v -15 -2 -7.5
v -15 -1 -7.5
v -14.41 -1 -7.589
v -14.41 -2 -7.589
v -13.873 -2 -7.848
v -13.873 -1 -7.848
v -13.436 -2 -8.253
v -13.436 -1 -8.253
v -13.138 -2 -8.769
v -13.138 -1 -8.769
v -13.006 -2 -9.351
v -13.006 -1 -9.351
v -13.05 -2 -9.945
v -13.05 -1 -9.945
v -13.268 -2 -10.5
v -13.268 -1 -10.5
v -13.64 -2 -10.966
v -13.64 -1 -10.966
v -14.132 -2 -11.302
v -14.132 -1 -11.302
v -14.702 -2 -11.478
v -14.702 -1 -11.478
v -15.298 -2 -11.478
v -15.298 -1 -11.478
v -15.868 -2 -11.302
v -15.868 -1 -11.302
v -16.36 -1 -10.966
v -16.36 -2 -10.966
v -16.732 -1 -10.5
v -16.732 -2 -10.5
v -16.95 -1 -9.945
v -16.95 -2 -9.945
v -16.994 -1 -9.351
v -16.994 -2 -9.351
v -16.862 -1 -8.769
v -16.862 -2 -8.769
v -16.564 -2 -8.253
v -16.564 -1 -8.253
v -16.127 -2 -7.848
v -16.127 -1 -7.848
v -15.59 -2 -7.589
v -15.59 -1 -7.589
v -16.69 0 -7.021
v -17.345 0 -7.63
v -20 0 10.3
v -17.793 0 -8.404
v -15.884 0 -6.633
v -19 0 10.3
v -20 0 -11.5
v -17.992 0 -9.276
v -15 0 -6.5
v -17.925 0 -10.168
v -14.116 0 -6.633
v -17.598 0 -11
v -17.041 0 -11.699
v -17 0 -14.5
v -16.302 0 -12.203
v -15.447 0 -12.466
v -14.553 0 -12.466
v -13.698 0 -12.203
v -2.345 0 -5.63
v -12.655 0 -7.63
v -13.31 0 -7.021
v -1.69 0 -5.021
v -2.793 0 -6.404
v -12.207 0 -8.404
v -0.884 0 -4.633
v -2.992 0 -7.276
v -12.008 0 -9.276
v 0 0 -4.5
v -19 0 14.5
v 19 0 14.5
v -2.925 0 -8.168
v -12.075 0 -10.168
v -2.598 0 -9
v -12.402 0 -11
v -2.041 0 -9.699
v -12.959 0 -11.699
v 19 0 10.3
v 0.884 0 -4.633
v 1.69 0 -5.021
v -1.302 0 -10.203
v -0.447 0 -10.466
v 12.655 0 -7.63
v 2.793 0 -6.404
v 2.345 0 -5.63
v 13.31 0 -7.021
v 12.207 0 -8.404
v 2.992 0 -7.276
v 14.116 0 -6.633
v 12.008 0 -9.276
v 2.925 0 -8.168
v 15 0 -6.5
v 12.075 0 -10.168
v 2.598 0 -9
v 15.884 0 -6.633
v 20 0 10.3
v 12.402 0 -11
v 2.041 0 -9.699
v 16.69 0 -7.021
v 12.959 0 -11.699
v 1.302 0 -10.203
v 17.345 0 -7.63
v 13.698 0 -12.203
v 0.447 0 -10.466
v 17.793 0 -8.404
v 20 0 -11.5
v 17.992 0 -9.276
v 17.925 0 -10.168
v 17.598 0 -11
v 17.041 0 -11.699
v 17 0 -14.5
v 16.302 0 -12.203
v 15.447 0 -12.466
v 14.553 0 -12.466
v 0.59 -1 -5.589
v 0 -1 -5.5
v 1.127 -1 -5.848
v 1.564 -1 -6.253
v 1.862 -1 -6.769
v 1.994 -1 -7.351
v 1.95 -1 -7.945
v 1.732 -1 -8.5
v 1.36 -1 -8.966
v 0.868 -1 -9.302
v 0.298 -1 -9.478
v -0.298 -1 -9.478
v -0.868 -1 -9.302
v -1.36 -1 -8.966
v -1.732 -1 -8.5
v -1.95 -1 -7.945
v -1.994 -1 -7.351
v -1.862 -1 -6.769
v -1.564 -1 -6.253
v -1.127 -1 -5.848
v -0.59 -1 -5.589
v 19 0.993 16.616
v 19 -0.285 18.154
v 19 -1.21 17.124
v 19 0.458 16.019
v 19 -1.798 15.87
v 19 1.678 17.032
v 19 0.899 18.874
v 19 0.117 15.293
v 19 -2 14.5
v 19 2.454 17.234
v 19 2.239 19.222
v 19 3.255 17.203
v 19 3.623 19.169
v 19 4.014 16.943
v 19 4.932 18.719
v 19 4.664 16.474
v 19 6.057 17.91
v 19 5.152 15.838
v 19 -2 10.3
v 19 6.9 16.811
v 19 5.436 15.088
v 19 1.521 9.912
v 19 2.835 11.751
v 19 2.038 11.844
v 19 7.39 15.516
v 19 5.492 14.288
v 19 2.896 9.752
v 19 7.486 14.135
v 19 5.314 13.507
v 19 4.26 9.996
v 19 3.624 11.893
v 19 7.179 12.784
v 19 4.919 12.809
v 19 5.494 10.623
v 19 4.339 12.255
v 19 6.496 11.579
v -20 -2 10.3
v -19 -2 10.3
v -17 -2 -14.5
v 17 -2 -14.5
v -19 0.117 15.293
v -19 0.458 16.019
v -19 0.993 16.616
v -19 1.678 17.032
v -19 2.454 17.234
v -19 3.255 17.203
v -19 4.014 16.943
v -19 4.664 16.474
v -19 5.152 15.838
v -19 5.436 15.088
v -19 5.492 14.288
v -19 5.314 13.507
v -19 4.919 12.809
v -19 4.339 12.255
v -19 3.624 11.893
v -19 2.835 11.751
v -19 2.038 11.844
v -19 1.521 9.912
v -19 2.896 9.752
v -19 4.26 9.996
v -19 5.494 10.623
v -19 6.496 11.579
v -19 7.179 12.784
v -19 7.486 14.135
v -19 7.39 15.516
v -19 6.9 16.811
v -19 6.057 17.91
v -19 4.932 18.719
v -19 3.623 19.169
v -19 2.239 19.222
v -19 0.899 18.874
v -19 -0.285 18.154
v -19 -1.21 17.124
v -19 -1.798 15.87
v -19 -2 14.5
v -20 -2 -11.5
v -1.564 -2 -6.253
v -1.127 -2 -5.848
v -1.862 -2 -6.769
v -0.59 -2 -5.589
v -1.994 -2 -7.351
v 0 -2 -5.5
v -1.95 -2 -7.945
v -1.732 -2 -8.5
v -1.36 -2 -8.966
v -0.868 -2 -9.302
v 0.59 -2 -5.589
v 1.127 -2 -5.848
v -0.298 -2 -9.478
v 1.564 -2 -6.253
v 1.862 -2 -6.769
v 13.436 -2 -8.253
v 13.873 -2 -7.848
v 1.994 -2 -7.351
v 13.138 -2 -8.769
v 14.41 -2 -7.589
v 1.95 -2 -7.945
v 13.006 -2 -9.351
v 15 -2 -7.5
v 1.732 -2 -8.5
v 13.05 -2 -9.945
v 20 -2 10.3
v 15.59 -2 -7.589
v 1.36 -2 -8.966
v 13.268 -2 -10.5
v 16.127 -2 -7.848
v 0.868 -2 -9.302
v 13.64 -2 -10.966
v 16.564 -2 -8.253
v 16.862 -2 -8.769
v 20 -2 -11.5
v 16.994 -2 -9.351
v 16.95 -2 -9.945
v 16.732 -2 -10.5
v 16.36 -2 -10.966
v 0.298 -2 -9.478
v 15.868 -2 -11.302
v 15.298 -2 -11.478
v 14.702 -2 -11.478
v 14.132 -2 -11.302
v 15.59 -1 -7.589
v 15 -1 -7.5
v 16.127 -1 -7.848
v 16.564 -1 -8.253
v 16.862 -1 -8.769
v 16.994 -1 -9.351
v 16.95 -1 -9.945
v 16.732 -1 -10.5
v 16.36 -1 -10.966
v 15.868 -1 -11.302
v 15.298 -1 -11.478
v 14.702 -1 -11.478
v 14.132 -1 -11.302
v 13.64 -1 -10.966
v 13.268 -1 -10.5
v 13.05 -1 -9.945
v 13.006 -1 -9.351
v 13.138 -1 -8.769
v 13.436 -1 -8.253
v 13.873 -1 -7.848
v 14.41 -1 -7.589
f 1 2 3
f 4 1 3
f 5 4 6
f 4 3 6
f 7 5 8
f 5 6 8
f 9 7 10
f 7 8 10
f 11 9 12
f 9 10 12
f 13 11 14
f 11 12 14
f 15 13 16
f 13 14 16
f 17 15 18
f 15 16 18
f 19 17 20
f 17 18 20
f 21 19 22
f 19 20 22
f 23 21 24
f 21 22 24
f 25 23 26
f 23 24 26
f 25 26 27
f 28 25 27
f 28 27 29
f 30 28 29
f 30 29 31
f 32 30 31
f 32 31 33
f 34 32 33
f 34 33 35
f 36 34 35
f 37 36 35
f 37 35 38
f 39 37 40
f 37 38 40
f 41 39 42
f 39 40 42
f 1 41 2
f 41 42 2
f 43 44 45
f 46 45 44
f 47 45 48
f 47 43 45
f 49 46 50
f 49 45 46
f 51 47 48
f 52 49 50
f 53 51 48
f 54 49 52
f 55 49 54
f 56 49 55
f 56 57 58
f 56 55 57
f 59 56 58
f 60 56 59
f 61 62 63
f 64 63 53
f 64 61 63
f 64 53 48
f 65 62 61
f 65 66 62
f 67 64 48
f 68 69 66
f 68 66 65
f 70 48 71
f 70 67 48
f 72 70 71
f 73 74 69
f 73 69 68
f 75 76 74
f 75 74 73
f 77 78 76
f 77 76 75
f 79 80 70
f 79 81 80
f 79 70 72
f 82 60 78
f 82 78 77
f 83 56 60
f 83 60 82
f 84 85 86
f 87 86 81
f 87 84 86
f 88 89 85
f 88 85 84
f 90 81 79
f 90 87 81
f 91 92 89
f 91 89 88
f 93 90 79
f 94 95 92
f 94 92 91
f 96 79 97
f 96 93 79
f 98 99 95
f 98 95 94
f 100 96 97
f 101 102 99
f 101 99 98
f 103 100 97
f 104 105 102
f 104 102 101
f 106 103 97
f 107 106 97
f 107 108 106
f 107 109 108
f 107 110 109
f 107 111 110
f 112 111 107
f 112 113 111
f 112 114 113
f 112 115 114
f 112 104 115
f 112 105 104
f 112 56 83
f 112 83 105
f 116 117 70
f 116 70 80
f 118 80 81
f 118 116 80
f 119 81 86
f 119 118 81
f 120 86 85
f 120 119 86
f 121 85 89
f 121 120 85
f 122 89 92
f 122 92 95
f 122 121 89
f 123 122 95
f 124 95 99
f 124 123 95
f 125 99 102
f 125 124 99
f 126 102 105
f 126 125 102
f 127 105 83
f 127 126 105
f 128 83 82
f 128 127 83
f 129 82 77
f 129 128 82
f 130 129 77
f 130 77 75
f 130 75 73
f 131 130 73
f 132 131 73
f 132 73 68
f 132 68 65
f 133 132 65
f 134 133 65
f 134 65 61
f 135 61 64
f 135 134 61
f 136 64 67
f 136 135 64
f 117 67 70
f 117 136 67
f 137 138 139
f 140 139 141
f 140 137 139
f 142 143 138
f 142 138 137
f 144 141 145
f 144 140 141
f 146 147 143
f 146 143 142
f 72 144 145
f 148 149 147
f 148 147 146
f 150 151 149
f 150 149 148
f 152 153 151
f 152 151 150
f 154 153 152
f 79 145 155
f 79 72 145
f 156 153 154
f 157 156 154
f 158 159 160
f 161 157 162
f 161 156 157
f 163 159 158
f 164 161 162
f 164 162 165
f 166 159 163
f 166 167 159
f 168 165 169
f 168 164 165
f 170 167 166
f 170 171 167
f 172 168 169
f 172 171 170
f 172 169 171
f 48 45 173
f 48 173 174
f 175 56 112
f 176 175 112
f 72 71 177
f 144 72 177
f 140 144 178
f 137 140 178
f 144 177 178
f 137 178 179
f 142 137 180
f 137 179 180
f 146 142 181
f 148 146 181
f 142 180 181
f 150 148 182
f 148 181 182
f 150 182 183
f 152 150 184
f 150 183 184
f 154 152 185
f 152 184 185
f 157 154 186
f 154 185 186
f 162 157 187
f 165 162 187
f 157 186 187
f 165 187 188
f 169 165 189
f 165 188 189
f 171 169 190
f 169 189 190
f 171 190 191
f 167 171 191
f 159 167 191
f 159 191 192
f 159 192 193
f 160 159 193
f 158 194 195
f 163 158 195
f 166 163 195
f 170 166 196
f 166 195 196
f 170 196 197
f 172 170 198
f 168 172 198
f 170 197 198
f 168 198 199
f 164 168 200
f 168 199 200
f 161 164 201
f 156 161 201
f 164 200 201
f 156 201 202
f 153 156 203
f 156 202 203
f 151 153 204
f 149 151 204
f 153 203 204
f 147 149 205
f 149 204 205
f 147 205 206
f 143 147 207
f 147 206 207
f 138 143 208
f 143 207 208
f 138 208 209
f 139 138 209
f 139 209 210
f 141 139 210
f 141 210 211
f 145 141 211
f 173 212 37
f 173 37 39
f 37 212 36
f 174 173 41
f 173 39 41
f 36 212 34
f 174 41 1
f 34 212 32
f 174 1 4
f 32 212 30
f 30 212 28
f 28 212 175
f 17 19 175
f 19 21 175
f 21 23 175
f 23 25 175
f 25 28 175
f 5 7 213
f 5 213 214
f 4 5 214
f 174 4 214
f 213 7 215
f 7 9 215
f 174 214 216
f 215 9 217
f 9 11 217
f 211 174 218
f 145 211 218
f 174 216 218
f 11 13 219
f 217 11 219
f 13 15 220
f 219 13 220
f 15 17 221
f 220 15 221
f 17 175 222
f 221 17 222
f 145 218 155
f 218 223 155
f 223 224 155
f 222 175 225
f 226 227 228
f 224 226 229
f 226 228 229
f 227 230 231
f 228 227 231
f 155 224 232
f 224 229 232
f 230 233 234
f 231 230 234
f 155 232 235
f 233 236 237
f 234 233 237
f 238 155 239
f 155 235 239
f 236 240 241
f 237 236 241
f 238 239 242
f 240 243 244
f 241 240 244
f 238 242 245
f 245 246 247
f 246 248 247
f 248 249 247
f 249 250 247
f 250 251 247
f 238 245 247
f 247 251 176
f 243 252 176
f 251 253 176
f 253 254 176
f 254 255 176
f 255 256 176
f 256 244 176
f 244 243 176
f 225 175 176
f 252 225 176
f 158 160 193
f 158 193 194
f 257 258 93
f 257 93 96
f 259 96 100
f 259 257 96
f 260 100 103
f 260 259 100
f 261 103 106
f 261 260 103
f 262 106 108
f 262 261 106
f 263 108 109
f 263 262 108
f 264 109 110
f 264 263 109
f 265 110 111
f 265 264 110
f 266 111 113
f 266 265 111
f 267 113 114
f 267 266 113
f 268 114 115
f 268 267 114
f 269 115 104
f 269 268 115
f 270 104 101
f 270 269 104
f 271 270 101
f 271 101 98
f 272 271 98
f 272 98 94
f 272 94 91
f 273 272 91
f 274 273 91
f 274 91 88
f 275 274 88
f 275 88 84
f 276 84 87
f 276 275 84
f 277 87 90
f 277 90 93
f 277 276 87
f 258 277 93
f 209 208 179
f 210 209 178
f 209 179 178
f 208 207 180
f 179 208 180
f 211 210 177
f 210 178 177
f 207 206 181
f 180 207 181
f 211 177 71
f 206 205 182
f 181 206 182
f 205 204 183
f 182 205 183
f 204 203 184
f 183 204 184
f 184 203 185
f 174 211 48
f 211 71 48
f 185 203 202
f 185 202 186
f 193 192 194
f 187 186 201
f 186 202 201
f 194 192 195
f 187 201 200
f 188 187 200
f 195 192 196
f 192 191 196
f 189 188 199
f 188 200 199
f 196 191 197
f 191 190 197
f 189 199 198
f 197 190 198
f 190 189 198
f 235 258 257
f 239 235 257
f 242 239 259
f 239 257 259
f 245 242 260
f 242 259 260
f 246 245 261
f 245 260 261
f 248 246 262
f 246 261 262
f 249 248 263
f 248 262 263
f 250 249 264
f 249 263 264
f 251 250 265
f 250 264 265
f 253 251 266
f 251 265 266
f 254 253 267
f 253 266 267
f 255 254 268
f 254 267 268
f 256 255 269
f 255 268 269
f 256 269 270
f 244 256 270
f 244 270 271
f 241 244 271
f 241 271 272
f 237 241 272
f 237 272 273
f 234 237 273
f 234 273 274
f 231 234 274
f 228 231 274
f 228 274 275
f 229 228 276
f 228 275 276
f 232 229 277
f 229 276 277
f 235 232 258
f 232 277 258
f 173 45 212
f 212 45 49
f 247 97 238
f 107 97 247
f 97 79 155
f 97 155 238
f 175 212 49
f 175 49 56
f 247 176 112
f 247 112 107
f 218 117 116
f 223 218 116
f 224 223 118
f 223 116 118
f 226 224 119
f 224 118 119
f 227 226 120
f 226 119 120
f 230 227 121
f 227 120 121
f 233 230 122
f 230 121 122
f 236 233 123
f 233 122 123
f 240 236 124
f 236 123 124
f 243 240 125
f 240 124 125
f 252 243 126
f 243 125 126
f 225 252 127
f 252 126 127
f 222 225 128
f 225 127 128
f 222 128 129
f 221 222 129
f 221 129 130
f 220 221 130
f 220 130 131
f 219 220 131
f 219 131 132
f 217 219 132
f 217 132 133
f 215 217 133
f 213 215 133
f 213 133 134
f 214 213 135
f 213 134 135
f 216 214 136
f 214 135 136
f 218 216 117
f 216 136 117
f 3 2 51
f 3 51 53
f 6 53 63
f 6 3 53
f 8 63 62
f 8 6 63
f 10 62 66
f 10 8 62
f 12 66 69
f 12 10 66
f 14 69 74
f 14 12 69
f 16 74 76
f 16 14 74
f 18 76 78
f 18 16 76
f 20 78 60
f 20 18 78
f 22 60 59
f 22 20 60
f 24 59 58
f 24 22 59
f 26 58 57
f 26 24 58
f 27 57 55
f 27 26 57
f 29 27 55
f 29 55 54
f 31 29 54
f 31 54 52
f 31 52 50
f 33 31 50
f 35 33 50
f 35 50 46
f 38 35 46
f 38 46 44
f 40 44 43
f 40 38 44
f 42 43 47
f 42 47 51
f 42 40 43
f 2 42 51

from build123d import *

# Parameters (mm, degrees)
SKETCH1_W           = 40
SKETCH1_H           = 29
BASE_FLANGE1_DEPTH  = 2
BREAK_CORNER1_START = -2
BREAK_CORNER1_DEPTH = 2
HEM2_START          = -19
HEM2_DEPTH          = 38
SKETCH10_W          = 1
SKETCH10_H          = 4.2
CUT_EXTRUDE1_DEPTH  = 10
SKETCH11_R          = 2
CUT_EXTRUDE2_DEPTH  = 2
CHAMFER1_SIZE       = 1


# Read off the part's stored shape, not the designer's step: Break-Corner1, Hem2
# Sheet-metal steps are written as plain solids
with BuildPart() as part:
    # Sketch1 → Base-Flange1 (new body)
    with BuildSketch(Plane(origin=(0, 0, 0), x_dir=(1, 0, 0), z_dir=(0, 1, 0))):
        Rectangle(SKETCH1_W, SKETCH1_H)
    extrude(amount=-BASE_FLANGE1_DEPTH)

    # Break-Corner1 outline → Break-Corner1 (cut)
    with BuildSketch(Plane(origin=(0, 0, 0), x_dir=(1, 0, 0), z_dir=(0, 1, 0)).offset(BREAK_CORNER1_START)):
        Polygon((-20, 14.5), (-20, 11.5), (-17, 14.5), align=None)
        Polygon((20, 14.5), (17, 14.5), (20, 11.5), align=None)
    extrude(amount=BREAK_CORNER1_DEPTH, mode=Mode.SUBTRACT)

    # Hem2 outline → Hem2 (add)
    with BuildSketch(Plane.YZ.offset(HEM2_START)):
        with BuildLine():
            Line((2.038247626, 11.843703978), (1.520609536, 9.911852325))
            ThreePointArc((1.520609536, 9.911852325), (6.518428366, 17.391616788), (-2, 14.5))
            Line((-2, 14.5), (0, 14.5))
            ThreePointArc((0, 14.5), (4.931721686, 16.17409393), (2.038247626, 11.843703978))
        make_face()
    extrude(amount=HEM2_DEPTH)

    # Sketch10 → Cut-Extrude1 (cut)
    with BuildSketch(Plane(origin=(0, 0, 0), x_dir=(1, 0, 0), z_dir=(0, 1, 0))):
        with Locations((19.5, -12.4)):
            Rectangle(SKETCH10_W, SKETCH10_H)
        with Locations((-19.5, -12.4)):
            Rectangle(SKETCH10_W, SKETCH10_H)
    extrude(amount=-CUT_EXTRUDE1_DEPTH, mode=Mode.SUBTRACT)

    # Sketch11 → Cut-Extrude2 (cut)
    with BuildSketch(Plane(origin=(0, 0, 0), x_dir=(1, 0, 0), z_dir=(0, 1, 0))):
        with Locations(Location((-15, 9.5, 0), (0, 0, 270))):
            Circle(SKETCH11_R)
        with Locations(Location((0, 7.5, 0), (0, 0, 270))):
            Circle(SKETCH11_R)
        with Locations(Location((15, 9.5, 0), (0, 0, 270))):
            Circle(SKETCH11_R)
    extrude(amount=-CUT_EXTRUDE2_DEPTH, mode=Mode.SUBTRACT)

    # Chamfer1
    chamfer1_edges = [part.edges().sort_by_distance(p)[0] for p in [
        (-15, 0, -11.5),
        (0, 0, -9.5),
        (15, 0, -11.5),
    ]]
    chamfer(chamfer1_edges, length=CHAMFER1_SIZE)


solid = part.part
